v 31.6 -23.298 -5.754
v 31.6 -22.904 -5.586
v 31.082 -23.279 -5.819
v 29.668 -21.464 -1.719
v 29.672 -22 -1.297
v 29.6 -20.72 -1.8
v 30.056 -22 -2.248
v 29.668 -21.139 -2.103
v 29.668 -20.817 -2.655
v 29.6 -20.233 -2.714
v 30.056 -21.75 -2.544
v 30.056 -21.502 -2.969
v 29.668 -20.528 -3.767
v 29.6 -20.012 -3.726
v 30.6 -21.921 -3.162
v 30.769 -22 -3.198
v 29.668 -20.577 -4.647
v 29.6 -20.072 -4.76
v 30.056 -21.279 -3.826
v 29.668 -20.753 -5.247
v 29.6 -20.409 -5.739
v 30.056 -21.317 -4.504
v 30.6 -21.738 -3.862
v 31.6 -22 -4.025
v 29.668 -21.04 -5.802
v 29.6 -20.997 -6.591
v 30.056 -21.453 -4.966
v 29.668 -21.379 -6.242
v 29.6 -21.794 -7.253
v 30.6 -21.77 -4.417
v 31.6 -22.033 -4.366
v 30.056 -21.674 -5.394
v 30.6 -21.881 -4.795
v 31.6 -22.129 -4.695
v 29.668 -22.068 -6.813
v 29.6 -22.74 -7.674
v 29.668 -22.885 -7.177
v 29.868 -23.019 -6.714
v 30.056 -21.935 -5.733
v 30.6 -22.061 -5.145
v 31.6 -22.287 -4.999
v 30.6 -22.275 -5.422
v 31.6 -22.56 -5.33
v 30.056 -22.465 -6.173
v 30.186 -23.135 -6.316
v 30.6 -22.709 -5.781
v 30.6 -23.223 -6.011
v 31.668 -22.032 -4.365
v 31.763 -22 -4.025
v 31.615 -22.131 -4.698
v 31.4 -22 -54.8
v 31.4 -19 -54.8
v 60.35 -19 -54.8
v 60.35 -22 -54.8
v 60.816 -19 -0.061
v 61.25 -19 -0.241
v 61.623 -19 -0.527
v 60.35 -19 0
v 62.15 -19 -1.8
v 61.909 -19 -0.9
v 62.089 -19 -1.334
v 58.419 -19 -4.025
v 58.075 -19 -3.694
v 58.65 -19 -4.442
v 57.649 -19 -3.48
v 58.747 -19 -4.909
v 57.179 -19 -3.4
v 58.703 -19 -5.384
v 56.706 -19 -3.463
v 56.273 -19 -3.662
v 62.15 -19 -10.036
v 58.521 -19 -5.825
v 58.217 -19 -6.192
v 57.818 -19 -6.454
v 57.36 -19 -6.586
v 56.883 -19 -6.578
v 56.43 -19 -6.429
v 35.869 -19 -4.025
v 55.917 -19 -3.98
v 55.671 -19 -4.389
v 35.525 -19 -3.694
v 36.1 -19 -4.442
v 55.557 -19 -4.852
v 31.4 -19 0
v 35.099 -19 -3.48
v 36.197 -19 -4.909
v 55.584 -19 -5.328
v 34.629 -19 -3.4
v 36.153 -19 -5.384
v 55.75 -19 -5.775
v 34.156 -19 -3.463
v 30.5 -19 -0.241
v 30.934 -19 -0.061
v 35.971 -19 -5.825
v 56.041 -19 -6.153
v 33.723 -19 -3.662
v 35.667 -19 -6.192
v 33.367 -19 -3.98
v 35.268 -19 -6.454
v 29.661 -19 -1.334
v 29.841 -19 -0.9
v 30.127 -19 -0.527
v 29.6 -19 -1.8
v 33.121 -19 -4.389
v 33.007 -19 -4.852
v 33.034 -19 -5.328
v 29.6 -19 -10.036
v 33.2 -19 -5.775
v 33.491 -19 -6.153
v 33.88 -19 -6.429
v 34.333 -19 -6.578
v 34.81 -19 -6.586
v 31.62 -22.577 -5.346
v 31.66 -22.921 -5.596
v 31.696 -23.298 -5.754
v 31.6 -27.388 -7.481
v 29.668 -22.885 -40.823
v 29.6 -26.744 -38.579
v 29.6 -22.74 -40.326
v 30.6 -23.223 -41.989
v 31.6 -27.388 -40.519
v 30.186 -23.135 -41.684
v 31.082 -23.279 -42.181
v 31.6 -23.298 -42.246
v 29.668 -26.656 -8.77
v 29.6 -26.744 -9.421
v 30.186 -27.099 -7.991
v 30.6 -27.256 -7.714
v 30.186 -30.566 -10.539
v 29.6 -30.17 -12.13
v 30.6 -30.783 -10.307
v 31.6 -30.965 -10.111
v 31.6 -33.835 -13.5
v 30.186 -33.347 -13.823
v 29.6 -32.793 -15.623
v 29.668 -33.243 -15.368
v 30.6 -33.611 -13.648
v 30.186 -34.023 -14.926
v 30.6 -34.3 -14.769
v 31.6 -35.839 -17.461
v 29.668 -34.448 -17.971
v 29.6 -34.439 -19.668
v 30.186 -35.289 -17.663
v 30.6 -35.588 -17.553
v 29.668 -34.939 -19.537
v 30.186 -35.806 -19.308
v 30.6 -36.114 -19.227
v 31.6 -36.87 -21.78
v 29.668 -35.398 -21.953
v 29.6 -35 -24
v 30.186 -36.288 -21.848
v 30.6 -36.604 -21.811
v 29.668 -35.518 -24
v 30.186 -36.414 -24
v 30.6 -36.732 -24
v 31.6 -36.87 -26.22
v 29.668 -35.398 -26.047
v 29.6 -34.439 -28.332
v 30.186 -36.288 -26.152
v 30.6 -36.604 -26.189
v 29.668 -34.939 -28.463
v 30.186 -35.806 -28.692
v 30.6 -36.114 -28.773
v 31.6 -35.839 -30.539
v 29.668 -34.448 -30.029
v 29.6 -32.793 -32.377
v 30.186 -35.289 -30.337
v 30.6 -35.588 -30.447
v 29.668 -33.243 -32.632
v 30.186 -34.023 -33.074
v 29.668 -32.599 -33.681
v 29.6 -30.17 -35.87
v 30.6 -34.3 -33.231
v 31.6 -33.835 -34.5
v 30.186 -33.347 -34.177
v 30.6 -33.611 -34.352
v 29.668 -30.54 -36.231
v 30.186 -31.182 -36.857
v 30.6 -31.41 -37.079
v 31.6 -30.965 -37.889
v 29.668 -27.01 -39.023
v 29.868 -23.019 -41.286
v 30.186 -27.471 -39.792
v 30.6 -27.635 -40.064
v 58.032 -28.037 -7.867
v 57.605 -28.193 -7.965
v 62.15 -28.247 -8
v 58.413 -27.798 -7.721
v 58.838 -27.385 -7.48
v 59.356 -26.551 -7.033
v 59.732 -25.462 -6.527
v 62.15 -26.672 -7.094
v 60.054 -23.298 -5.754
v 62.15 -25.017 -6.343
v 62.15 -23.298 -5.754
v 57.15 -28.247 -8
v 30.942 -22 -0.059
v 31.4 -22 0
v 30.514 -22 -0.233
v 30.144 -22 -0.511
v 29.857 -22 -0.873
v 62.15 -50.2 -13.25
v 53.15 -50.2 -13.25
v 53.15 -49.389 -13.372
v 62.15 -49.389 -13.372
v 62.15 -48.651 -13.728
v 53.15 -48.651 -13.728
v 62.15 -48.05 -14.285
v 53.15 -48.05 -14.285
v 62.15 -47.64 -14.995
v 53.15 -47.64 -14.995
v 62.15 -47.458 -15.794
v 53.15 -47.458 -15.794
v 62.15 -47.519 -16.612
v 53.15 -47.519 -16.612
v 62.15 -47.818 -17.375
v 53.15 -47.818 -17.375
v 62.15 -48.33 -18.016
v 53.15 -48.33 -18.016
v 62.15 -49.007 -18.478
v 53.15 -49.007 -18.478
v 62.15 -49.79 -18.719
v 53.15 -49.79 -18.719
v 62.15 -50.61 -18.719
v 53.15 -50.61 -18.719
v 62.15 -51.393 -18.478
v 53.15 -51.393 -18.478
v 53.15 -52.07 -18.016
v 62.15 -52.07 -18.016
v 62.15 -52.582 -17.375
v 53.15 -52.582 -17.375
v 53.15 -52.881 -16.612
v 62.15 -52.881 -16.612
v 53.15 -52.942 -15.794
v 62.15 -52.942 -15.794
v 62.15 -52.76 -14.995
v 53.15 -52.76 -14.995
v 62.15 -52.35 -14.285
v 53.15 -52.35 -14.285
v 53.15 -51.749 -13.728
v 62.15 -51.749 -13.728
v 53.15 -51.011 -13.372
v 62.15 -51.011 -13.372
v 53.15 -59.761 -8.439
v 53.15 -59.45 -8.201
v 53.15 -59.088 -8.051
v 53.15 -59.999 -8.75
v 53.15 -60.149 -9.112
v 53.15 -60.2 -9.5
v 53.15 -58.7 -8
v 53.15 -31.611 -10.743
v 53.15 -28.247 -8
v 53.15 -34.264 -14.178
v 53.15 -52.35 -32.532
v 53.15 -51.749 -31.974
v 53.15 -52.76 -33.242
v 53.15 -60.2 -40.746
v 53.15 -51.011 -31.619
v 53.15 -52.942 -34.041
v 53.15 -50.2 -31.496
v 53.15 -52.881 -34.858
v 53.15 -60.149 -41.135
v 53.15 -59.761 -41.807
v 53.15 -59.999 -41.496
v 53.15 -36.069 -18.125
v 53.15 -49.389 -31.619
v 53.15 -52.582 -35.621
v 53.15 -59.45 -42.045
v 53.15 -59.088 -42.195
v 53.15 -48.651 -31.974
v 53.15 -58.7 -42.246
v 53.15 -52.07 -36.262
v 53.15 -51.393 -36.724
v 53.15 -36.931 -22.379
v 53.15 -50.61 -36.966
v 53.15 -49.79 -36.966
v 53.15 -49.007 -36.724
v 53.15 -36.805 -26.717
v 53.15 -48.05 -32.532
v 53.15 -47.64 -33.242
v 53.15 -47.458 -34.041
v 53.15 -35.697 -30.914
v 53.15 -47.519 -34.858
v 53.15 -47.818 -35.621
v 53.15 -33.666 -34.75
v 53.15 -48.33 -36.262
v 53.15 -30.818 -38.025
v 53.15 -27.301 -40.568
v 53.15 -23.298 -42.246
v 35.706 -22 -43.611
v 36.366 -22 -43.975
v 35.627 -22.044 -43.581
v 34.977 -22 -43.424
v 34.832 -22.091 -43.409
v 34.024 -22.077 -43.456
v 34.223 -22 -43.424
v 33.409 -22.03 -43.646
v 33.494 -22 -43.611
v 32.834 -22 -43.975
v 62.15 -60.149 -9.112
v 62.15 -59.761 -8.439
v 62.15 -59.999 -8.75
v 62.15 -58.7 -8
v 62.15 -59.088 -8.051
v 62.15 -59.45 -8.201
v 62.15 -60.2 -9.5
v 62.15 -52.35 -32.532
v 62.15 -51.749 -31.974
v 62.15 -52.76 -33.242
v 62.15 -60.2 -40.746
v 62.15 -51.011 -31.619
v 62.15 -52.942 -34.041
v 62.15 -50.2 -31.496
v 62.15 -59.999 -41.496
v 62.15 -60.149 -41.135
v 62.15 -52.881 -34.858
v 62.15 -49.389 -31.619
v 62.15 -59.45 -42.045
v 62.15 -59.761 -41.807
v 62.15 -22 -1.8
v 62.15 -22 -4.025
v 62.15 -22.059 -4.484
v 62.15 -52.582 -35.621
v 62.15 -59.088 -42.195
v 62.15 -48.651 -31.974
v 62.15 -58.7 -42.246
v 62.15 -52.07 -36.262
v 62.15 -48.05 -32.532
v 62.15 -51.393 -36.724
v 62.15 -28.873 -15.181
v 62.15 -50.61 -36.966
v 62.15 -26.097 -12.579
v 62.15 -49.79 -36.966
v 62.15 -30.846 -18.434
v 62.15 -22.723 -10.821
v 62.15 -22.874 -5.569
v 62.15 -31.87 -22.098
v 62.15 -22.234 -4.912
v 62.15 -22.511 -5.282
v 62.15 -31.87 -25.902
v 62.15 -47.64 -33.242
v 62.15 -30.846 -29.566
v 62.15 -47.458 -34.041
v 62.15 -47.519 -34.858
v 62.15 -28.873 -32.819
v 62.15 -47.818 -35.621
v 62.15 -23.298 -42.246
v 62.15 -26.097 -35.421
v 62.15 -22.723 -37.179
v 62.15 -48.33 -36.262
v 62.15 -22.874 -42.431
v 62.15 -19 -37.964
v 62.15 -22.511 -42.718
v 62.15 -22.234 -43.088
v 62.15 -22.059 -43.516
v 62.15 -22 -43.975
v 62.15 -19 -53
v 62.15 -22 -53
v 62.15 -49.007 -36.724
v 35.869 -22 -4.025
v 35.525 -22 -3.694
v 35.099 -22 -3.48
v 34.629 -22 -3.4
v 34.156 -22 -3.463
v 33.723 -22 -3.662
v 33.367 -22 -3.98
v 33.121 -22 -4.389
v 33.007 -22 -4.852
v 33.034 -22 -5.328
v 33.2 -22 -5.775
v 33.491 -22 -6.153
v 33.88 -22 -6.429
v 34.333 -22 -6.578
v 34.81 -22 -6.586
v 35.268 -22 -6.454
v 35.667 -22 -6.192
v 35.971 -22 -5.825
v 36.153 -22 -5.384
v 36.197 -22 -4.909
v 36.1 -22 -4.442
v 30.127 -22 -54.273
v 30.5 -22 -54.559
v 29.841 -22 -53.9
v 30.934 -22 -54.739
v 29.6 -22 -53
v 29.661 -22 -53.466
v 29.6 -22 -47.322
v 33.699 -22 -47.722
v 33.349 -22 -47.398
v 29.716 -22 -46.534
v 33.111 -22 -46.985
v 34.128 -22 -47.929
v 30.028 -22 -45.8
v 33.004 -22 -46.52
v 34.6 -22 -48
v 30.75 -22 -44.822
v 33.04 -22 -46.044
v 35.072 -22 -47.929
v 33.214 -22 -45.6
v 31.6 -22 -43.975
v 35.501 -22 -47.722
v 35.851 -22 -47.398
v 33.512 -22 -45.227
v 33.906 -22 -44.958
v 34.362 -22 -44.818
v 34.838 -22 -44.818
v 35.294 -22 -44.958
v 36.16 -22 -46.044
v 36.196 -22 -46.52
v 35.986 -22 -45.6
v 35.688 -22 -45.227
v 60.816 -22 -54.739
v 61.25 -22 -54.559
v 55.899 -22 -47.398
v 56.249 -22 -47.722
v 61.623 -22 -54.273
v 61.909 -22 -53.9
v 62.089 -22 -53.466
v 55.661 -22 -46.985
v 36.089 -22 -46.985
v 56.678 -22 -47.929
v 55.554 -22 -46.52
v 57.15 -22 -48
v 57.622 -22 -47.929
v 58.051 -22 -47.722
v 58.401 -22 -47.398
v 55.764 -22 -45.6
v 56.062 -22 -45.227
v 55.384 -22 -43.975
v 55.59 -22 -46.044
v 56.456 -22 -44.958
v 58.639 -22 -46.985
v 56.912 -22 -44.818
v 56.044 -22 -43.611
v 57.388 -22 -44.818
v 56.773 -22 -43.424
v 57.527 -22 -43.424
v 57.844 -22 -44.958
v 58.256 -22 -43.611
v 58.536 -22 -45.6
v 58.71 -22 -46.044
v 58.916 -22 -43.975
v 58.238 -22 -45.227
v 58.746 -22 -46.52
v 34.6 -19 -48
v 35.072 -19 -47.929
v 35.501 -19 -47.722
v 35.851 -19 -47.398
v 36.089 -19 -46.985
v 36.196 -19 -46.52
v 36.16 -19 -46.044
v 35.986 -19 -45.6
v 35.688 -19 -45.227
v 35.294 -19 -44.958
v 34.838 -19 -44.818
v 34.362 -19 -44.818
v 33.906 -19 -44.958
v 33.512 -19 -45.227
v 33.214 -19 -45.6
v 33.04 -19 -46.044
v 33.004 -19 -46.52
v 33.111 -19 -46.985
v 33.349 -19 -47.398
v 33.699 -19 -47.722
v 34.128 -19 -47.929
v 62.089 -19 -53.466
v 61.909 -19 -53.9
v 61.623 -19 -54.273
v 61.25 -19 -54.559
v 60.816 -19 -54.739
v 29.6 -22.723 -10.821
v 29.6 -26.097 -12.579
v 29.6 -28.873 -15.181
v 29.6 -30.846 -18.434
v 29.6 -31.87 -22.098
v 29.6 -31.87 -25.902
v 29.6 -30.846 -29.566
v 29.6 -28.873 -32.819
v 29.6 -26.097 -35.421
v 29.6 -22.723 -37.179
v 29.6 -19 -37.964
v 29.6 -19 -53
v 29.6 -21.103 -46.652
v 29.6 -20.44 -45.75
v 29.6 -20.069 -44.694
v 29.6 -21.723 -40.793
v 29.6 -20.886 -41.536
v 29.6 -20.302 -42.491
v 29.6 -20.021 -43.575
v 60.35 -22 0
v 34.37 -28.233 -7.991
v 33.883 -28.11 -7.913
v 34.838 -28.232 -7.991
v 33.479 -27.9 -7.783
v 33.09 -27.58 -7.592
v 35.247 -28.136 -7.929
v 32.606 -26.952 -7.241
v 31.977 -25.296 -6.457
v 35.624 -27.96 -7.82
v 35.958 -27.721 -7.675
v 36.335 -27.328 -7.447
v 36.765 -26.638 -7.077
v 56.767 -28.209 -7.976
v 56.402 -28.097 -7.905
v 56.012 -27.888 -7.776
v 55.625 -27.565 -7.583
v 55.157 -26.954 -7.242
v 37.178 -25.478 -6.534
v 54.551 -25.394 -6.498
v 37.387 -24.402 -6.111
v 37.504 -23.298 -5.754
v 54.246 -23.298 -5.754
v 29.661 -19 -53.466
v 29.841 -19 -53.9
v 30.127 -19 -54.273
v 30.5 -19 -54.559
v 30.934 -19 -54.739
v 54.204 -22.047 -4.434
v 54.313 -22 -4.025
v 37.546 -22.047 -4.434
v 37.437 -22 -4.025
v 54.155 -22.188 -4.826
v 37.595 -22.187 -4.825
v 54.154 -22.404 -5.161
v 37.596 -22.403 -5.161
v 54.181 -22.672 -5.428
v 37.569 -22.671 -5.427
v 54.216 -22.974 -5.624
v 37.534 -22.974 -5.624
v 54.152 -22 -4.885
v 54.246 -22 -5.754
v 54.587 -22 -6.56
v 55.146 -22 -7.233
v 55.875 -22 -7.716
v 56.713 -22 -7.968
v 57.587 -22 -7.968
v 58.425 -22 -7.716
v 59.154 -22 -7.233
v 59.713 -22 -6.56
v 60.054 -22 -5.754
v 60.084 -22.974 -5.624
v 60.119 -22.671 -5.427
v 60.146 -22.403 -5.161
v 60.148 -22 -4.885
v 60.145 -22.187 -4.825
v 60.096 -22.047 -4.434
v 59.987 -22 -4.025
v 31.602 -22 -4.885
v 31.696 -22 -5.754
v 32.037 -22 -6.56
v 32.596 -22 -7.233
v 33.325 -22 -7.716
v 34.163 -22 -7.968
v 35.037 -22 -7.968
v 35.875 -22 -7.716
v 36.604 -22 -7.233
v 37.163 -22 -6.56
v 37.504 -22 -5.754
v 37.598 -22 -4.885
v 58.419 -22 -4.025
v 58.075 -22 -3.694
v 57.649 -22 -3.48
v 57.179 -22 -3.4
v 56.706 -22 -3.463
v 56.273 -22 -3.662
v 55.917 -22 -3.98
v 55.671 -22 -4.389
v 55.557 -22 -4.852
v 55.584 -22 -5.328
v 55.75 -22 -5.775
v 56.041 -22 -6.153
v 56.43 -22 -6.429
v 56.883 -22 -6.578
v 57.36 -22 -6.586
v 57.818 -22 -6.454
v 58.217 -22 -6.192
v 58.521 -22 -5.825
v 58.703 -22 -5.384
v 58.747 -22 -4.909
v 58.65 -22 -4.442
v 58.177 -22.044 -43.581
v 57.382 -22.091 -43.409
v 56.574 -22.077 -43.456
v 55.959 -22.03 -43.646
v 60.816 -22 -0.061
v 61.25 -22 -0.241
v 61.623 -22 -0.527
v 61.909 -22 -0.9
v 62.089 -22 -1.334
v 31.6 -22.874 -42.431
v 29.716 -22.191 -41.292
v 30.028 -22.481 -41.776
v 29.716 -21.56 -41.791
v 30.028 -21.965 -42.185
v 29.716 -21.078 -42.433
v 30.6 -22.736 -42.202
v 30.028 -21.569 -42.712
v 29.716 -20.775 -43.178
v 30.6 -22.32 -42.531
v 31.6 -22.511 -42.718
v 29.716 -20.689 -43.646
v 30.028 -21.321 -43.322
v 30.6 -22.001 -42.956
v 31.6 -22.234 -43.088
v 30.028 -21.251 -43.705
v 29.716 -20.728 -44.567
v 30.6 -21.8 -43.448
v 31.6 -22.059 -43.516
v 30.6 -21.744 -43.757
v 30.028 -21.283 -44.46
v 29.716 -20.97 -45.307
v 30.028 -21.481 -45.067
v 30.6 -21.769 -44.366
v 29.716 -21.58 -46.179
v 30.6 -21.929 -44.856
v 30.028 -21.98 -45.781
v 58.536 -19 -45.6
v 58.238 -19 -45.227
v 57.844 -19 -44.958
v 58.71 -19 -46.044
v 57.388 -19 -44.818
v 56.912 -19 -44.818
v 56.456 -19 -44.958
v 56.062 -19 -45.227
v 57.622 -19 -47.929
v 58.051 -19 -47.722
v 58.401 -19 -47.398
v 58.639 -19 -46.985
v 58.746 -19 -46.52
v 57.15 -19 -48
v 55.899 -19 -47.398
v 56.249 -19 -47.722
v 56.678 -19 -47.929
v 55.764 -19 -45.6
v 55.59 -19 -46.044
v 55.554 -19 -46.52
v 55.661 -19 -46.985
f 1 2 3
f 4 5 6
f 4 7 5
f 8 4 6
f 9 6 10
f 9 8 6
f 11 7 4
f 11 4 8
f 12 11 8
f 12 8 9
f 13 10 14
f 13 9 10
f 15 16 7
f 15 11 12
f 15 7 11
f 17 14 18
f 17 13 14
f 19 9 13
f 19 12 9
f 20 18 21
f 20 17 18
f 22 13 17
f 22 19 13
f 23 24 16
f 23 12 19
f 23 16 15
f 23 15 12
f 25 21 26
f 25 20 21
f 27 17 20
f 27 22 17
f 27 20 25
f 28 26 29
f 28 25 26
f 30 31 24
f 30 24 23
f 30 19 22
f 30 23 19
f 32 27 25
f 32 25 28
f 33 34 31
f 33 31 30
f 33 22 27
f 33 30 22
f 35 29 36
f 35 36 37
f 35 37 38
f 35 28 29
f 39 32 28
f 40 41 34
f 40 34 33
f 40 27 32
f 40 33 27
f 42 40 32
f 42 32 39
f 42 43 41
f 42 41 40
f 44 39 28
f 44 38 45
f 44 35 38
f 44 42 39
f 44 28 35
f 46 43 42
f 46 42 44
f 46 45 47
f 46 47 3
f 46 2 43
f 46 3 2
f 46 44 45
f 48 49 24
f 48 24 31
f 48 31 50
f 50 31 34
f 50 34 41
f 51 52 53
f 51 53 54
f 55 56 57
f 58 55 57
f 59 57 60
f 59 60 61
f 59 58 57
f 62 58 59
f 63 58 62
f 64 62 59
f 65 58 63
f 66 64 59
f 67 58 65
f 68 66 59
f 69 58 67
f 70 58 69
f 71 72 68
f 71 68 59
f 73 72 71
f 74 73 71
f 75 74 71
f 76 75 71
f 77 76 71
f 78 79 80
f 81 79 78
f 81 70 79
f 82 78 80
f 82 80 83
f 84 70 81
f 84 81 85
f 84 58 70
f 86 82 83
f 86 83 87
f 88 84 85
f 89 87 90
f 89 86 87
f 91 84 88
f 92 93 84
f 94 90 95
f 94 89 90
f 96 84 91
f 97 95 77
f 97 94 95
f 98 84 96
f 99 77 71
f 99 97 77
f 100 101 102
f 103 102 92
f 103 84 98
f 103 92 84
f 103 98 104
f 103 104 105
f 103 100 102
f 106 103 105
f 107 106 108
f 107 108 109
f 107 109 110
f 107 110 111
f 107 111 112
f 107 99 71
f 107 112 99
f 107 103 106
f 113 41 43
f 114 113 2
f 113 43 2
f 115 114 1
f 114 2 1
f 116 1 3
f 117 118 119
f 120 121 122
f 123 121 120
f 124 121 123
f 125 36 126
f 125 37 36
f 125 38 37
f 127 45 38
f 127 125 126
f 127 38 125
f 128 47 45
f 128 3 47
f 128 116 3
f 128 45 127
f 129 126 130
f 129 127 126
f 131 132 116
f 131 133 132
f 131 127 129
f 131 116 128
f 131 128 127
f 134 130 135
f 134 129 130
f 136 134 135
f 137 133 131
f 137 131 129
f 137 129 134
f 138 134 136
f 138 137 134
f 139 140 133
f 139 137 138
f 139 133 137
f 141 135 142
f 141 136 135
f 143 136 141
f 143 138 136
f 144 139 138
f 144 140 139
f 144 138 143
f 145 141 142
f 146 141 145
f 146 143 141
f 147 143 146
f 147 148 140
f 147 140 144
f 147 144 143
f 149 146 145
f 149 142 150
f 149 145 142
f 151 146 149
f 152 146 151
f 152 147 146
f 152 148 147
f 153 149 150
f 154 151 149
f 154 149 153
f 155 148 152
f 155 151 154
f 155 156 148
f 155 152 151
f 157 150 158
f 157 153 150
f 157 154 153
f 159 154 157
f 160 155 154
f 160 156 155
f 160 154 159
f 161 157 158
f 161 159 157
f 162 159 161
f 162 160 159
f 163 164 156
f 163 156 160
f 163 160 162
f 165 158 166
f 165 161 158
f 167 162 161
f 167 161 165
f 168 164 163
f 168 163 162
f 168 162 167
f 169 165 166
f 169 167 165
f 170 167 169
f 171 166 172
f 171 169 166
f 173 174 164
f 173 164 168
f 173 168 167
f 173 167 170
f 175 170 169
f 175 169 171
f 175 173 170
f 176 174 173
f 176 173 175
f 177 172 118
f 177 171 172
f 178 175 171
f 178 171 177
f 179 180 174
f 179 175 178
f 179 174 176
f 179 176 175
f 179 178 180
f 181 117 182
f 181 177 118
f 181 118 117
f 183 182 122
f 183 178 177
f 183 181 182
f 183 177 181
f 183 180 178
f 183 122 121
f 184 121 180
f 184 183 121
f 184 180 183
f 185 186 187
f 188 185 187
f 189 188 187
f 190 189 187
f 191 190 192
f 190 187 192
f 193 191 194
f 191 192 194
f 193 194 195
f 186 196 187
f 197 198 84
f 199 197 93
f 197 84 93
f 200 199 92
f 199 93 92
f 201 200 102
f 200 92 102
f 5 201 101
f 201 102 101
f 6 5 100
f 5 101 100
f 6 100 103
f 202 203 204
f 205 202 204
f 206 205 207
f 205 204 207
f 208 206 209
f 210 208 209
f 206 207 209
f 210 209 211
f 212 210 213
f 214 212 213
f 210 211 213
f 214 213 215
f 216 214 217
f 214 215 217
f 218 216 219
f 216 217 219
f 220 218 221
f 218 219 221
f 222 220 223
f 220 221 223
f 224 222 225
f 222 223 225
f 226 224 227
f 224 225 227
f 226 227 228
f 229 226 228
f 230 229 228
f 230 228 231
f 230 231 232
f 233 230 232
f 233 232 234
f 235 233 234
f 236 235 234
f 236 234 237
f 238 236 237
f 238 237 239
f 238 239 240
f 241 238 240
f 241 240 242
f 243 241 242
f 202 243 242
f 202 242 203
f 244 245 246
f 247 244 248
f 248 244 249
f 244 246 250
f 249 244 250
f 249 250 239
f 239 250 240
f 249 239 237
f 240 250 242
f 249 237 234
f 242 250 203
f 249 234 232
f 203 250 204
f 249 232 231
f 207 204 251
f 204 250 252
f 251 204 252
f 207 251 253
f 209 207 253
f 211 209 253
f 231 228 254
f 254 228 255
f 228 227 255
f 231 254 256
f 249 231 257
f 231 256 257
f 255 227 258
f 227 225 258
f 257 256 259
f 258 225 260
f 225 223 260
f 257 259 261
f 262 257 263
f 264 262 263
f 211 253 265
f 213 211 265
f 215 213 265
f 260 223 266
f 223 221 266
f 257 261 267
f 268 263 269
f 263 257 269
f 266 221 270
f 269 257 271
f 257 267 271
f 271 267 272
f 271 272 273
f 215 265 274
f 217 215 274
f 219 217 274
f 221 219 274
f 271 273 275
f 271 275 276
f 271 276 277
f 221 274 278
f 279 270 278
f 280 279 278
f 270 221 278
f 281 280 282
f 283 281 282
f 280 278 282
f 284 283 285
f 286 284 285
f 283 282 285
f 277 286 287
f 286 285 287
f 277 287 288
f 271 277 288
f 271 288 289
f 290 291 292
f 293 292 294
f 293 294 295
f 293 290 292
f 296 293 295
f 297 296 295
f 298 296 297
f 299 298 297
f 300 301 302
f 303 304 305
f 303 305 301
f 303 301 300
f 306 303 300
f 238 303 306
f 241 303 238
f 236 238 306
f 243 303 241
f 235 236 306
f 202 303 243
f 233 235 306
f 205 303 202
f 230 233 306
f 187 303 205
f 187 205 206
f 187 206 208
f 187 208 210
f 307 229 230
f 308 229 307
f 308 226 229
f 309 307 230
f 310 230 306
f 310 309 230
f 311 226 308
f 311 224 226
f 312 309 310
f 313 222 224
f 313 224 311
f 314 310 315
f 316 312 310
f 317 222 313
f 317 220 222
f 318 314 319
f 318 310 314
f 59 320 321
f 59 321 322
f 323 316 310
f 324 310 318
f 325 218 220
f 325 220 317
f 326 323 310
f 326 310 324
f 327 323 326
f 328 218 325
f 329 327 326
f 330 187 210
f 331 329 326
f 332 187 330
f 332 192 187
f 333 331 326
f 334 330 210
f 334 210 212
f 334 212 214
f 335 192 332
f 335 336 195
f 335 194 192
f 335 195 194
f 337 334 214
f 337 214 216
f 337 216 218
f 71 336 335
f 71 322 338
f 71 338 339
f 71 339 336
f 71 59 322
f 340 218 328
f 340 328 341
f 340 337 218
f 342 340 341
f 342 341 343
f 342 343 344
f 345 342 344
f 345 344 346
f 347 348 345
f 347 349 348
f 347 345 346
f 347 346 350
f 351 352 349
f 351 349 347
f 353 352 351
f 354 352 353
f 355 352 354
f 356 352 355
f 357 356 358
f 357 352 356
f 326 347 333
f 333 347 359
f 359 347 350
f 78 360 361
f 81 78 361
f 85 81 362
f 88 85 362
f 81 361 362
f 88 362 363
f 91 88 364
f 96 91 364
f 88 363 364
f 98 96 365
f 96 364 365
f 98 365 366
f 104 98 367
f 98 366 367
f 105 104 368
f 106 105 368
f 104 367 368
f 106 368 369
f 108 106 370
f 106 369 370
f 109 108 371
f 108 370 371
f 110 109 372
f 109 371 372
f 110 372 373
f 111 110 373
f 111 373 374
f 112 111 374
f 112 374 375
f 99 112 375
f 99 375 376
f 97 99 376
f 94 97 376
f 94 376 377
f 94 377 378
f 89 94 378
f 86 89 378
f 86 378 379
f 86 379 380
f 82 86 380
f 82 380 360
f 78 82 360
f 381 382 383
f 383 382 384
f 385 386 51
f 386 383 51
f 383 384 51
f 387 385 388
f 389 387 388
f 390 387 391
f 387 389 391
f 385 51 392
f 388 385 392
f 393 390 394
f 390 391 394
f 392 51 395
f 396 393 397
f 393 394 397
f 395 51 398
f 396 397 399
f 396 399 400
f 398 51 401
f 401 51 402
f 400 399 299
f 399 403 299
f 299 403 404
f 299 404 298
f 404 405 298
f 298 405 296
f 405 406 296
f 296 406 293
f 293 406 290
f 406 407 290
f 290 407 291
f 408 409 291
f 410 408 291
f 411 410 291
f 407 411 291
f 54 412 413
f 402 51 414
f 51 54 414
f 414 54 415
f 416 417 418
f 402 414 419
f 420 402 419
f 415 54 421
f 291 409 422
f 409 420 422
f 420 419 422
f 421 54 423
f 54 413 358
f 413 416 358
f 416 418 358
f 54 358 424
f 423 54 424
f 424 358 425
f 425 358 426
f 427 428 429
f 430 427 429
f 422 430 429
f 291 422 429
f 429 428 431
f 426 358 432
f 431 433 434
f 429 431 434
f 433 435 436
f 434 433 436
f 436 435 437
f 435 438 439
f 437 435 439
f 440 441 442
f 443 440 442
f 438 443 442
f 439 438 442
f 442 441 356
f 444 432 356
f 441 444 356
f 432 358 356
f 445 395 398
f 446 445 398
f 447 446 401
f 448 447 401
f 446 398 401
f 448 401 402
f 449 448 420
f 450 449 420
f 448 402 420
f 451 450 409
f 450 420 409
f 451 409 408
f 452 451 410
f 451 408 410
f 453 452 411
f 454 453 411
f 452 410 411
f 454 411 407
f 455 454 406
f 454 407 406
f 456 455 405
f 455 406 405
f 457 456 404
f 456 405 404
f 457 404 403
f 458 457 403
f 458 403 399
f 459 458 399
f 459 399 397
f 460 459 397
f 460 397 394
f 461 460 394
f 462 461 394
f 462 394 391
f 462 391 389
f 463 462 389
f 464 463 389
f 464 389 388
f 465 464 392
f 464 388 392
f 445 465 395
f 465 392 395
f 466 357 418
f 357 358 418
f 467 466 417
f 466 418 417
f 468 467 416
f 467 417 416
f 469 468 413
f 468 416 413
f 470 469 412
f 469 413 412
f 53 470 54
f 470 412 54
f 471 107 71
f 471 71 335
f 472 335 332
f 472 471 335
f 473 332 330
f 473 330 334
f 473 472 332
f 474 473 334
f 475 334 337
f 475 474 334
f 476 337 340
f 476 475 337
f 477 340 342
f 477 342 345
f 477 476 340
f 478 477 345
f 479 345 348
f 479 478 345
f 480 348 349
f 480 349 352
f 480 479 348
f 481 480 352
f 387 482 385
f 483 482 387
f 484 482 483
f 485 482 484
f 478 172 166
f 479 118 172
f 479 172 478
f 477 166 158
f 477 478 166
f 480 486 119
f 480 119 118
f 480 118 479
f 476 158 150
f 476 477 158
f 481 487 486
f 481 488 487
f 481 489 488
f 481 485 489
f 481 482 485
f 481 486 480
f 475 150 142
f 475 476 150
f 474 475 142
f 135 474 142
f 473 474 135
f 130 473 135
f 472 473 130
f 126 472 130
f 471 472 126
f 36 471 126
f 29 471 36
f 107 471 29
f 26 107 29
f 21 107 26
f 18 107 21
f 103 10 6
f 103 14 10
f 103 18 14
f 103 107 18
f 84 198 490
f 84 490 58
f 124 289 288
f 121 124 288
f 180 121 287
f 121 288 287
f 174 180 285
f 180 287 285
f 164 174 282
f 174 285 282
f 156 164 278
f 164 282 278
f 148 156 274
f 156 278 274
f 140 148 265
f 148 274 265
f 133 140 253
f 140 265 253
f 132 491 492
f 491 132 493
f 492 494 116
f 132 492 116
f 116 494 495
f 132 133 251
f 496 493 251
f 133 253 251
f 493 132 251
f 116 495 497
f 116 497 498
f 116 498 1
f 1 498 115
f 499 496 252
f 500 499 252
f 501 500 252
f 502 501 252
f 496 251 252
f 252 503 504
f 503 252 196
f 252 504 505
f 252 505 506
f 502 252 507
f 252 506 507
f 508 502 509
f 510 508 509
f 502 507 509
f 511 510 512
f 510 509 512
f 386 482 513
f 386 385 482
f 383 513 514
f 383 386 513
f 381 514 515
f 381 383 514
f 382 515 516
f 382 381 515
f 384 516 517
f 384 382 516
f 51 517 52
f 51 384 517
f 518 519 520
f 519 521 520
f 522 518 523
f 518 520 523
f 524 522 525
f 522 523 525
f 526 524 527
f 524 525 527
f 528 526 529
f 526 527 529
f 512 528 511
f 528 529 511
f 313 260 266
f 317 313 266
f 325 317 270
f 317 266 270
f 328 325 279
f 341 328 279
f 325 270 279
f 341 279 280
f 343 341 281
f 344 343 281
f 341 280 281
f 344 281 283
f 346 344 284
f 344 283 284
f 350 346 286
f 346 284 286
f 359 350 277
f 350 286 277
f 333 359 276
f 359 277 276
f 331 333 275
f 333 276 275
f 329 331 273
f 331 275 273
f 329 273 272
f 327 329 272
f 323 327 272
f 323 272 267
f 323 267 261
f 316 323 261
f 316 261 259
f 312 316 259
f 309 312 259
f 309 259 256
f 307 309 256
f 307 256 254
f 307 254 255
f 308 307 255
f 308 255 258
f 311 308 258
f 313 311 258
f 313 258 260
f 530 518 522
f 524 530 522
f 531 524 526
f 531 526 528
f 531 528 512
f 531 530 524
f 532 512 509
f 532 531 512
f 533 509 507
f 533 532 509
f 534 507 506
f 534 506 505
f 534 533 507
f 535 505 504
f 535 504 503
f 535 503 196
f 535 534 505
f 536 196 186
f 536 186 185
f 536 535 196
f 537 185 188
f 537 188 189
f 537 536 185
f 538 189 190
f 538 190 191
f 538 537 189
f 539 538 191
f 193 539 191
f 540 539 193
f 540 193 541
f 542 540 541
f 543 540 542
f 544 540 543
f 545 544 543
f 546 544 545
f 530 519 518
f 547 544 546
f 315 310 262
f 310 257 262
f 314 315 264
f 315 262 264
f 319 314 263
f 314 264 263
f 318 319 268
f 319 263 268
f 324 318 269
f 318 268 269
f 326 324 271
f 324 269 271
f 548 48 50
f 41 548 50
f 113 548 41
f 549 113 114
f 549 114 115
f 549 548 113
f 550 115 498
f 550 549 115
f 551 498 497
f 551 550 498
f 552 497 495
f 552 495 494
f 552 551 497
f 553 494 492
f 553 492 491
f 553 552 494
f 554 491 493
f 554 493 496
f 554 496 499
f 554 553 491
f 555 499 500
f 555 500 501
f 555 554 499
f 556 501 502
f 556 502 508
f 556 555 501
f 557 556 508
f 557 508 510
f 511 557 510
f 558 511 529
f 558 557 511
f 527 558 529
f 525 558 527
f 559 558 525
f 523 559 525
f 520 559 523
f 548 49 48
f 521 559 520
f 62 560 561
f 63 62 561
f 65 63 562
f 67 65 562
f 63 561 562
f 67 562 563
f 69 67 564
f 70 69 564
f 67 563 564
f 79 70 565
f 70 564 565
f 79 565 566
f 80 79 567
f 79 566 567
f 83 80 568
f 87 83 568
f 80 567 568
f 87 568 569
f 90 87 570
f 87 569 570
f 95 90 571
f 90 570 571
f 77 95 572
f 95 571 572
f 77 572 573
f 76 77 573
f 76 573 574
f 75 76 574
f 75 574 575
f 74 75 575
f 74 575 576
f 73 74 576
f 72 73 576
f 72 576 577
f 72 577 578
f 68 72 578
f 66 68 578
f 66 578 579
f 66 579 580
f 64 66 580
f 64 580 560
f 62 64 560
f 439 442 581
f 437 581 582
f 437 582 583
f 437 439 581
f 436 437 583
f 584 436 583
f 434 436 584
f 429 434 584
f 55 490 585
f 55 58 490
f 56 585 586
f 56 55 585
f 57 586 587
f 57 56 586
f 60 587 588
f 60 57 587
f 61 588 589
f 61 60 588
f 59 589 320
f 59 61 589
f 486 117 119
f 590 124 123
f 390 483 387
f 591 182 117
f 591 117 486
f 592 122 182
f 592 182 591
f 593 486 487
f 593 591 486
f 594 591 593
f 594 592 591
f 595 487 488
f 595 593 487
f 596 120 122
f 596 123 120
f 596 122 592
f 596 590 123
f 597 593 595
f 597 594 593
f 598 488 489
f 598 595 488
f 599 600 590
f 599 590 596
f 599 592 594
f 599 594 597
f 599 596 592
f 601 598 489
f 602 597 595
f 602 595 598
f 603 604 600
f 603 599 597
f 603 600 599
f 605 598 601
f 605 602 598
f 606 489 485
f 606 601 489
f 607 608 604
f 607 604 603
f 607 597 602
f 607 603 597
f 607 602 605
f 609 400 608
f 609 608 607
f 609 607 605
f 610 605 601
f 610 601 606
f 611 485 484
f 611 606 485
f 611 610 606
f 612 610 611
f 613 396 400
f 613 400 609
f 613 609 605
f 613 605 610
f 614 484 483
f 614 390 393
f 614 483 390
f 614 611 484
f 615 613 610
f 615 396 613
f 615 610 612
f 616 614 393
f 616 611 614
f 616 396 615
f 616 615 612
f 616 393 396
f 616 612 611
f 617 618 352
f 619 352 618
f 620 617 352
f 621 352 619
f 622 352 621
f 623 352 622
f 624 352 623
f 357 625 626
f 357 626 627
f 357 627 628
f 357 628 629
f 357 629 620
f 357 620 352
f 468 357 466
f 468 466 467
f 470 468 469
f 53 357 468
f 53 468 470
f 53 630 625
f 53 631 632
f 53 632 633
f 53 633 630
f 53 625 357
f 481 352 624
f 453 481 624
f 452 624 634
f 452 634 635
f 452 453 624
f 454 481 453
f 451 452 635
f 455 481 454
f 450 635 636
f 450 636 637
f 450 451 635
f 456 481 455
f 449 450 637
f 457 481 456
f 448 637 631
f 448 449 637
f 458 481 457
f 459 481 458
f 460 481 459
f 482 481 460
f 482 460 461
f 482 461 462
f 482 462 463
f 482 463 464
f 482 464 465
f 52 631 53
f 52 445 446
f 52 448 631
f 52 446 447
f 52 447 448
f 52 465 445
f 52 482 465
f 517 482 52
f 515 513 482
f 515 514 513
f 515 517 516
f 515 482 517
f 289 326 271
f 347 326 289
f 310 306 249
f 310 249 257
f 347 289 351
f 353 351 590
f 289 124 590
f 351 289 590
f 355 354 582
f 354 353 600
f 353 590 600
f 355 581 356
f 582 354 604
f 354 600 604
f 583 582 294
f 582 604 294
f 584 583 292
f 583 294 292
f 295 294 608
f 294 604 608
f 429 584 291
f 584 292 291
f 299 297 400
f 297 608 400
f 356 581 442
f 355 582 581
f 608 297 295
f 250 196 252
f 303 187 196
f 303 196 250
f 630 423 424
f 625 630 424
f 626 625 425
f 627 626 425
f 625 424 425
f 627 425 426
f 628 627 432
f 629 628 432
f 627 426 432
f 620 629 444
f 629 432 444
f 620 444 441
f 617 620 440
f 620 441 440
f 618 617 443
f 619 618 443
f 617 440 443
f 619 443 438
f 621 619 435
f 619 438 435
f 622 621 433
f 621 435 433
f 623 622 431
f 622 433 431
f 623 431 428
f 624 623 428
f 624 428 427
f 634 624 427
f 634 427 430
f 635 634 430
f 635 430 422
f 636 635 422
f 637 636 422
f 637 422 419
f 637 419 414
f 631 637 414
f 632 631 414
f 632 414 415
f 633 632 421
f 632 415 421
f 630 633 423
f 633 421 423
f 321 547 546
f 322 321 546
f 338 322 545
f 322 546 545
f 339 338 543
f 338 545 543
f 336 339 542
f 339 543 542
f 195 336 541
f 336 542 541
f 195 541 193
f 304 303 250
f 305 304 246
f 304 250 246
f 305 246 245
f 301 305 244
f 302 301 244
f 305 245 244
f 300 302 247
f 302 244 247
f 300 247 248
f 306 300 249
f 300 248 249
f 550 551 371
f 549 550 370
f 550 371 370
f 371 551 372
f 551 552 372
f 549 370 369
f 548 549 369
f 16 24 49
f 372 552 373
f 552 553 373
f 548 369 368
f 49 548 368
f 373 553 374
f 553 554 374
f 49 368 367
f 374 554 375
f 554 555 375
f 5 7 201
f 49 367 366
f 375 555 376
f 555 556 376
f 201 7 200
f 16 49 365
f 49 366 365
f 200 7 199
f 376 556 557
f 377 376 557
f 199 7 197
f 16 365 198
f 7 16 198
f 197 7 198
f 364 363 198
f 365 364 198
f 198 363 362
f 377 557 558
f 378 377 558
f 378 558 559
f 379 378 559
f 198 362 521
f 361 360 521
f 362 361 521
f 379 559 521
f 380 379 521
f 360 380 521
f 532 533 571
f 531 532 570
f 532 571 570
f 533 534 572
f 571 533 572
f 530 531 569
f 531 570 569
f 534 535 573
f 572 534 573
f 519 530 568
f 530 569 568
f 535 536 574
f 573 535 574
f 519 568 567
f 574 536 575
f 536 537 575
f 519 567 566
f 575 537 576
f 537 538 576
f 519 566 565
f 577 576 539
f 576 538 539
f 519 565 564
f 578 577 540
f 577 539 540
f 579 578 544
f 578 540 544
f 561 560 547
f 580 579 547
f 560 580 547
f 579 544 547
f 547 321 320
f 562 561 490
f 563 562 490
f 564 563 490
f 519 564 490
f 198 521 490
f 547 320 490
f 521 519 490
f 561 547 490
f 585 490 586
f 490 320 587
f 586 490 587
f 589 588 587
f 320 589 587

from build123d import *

# Parameters (mm, degrees)
SKETCH1_W                       = 62.15
SKETCH1_H                       = 78
BOSS_EXTRUDE1_DEPTH             = 9
SPRING_PULLEY_CUTOUT_DEPTH      = 10
SPRING_PULLEY_CUTOUT_DEPTH_BACK = 11.2
SKETCH2_R                       = 25
SKETCH3_R                       = 1.225
CUT_EXTRUDE2_DEPTH              = 7.5
SKETCH4_R                       = 0.75
CUT_EXTRUDE3_DEPTH              = 101.014361469
CHAMFER1_SIZE                   = 0.4
CHAMFER1_SIZE2                  = 0.692820323
MOTOR_HOLDER_DEPTH              = 32.95
MOVE_FACE7_BY                   = 0.4
SKETCH20_R                      = 2.55
CUT_EXTRUDE8_DEPTH              = 7
BOSS_EXTRUDE5_DEPTH             = 32.55
MOVE_FACE3_BY                   = 1
CUT_EXTRUDE12_DEPTH             = 108.086985671
FILLET12_R                      = 1.8
SKETCH24_R                      = 1.6
MOTOR_CLIP_HOLES_DEPTH          = 3
SKETCH26_W                      = 5.75
SKETCH26_H                      = 12.7
CUT_EXTRUDE13_DEPTH             = 110.829970864
SKETCH27_R                      = 2
CUT_EXTRUDE14_DEPTH             = 7.25
SKETCH29_R                      = 0.8
CUT_EXTRUDE16_DEPTH             = 5
SKETCH52_W                      = 78
SKETCH52_H                      = 9
CUT_EXTRUDE31_DEPTH             = 7.25
MOVE_START                      = -54.4
MOVE_FACE6_OUTLINE_W            = 5.75
MOVE_FACE6_OUTLINE_H            = 9
MOVE_FACE6_DEPTH                = 13.1
SKETCH31_W                      = 2
SKETCH31_H                      = 4
SKETCH32_R                      = 3
CUT_EXTRUDE17_DEPTH             = 105.439563953
MOTOR_CLIP_WIRE_FILLET_R        = 2
BOSS_EXTRUDE8_DEPTH             = 9
FILLET13_R                      = 1.5
M5_CLEARANCE_HOLE1_D            = 5.5


# Read off the part's stored shape, not the designer's step: Move Face6
with BuildPart() as part:
    # Sketch1 → Boss-Extrude1 (new body)
    with BuildSketch(Plane(origin=(0, 0, 0), x_dir=(1, 0, 0), z_dir=(0, 1, 0))):
        with Locations((31.075, 39)):
            Rectangle(SKETCH1_W, SKETCH1_H)
    extrude(amount=BOSS_EXTRUDE1_DEPTH)

    # Sketch2 → spring_pulley_cutout (cut, two sides: drawn at the far end of the back side and taken through both)
    with BuildSketch(Plane.ZY.offset(-18).offset(-SPRING_PULLEY_CUTOUT_DEPTH_BACK)):
        with Locations((-24, -18)):
            Circle(SKETCH2_R)
    extrude(amount=SPRING_PULLEY_CUTOUT_DEPTH + SPRING_PULLEY_CUTOUT_DEPTH_BACK, mode=Mode.SUBTRACT)

    # Sketch3 → Cut-Extrude2 (cut)
    with BuildSketch(Plane(origin=(0, 9, 0), x_dir=(1, 0, 0), z_dir=(0, 1, 0))):
        with Locations(Location((12.85, 4, 0), (0, 0, 270))):
            Circle(SKETCH3_R)
        with Locations(Location((23.15, 44, 0), (0, 0, 270))):
            Circle(SKETCH3_R)
    extrude(amount=-CUT_EXTRUDE2_DEPTH, mode=Mode.SUBTRACT)

    # Sketch4 → Cut-Extrude3 (cut, through all)
    with BuildSketch(Plane(origin=(0, 1.5, 0), x_dir=(1, 0, 0), z_dir=(0, 1, 0))):
        with Locations(Location((12.85, 4, 0), (0, 0, 270))):
            Circle(SKETCH4_R)
        with Locations(Location((23.15, 44, 0), (0, 0, 270))):
            Circle(SKETCH4_R)
    extrude(amount=-CUT_EXTRUDE3_DEPTH, mode=Mode.SUBTRACT)

    # Chamfer1
    chamfer1_edges = [part.edges().sort_by_distance(p)[0] for p in [
        (12.85, 9, -5.225),
        (23.15, 9, -45.225),
    ]]
    chamfer1_side = [part.faces().sort_by_distance(p)[0] for p in [
        (31.100480241, 9, -39.029231634),
    ]]
    chamfer(chamfer1_edges, length=CHAMFER1_SIZE, length2=CHAMFER1_SIZE2, reference=chamfer1_side[0])

    # Sketch19 → Motor Holder (add)
    with BuildSketch(Plane.ZY.offset(-29.2)):
        with BuildLine():
            Line((-54.8, -18), (-38, -18))
            ThreePointArc((-38, -18), (-24, -4), (-10, -18))
            Line((-10, -18), (0, -18))
            Line((0, -18), (0, 0))
            Line((0, 0), (-54.8, 0))
            Line((-54.8, 0), (-54.8, -18))
        make_face()
    extrude(amount=-MOTOR_HOLDER_DEPTH)

    # Move Face7: a face moved inward by 0.4
    extrude(part.faces().sort_by_distance((29.2, 0.75, -27.4))[0], amount=MOVE_FACE7_BY, dir=(1, 0, 0), mode=Mode.SUBTRACT)

    # Sketch20 → Cut-Extrude8 (cut)
    with BuildSketch(Plane(origin=(0, -18, 0), x_dir=(-1, 0, 0), z_dir=(0, -1, 0))):
        with Locations(Location((-57.15, 5, 0), (0, 0, 90))):
            Circle(SKETCH20_R)
        with Locations(Location((-34.6, 5, 0), (0, 0, 90))):
            Circle(SKETCH20_R)
        with Locations(Location((-57.15, 46.4, 0), (0, 0, 90))):
            Circle(SKETCH20_R)
        with Locations(Location((-34.6, 46.4, 0), (0, 0, 90))):
            Circle(SKETCH20_R)
    extrude(amount=-CUT_EXTRUDE8_DEPTH, mode=Mode.SUBTRACT)

    # Move Face3: a face moved inward by 1.0
    extrude(part.faces().sort_by_distance((8, 2.836578696, -24))[0], amount=MOVE_FACE3_BY, dir=(-1, 0, 0), mode=Mode.SUBTRACT)

    # Sketch26 → Cut-Extrude13 (cut, through all)
    with BuildSketch(Plane(origin=(0, 9, 0), x_dir=(1, 0, 0), z_dir=(0, 1, 0))):
        with Locations((10.125, 47.85)):
            Rectangle(SKETCH26_W, SKETCH26_H)
    extrude(amount=-CUT_EXTRUDE13_DEPTH, mode=Mode.SUBTRACT)

    # Sketch27 → Cut-Extrude14 (cut)
    with BuildSketch(Plane.ZY):
        with Locations((-44.6, 5)):
            Circle(SKETCH27_R)
        with Locations((-51.1, 5)):
            Circle(SKETCH27_R)
    extrude(amount=-CUT_EXTRUDE14_DEPTH, mode=Mode.SUBTRACT)

    # Sketch29 → Cut-Extrude16 (cut)
    with BuildSketch(Plane.ZY.offset(-13)):
        with Locations((-51.1, 5)):
            Circle(SKETCH29_R)
        with Locations((-44.6, 5)):
            Circle(SKETCH29_R)
    extrude(amount=-CUT_EXTRUDE16_DEPTH, mode=Mode.SUBTRACT)

    # Sketch52 → Cut-Extrude31 (cut)
    with BuildSketch(Plane.ZY):
        with Locations((-39, 4.5)):
            Rectangle(SKETCH52_W, SKETCH52_H)
    extrude(amount=-CUT_EXTRUDE31_DEPTH, mode=Mode.SUBTRACT)

    # Move Face6 outline → Move Face6 (cut)
    with BuildSketch(Plane.XY.offset(MOVE_START)):
        with Locations((10.125, 4.5)):
            Rectangle(MOVE_FACE6_OUTLINE_W, MOVE_FACE6_OUTLINE_H)
    extrude(amount=MOVE_FACE6_DEPTH, mode=Mode.SUBTRACT)

    # Cut-Sweep1: sweep along a path in Sketch30
    with BuildLine(Plane(origin=(0, -12, 0), x_dir=(-1, 0, 0), z_dir=(0, -1, 0))) as cut_sweep1_path:
        CenterArc((-45.875, 0), 5, 0, 360)
    # Sketch31 → Cut-Sweep1 (sweep, cut)
    with BuildSketch(Plane(origin=(0, 0, 0), x_dir=(-1, 0, 0), z_dir=(0, 0, -1))):
        with Locations((-42.875, -12)):
            Rectangle(SKETCH31_W, SKETCH31_H)
    sweep(path=cut_sweep1_path.line, mode=Mode.SUBTRACT)


with BuildPart() as body_2:
    # Sketch22 → Boss-Extrude5 (new body)
    with BuildSketch(Plane.ZY.offset(-29.6)):
        with BuildLine():
            Line((0, -19), (-10.035759956, -19))
            ThreePointArc((-10.035759956, -19), (-24, -32), (-37.964240044, -19))
            Line((-37.964240044, -19), (-54.8, -19))
            Line((-54.8, -19), (-54.8, -39))
            Line((-54.8, -39), (0, -39))
            Line((0, -39), (0, -19))
        make_face()
    extrude(amount=-BOSS_EXTRUDE5_DEPTH)

    # Sketch25 → Cut-Extrude12 (cut, through all)
    with BuildSketch(Plane(origin=(62.15, 0, 0), x_dir=(0, 0, -1), z_dir=(1, 0, 0))):
        with BuildLine():
            Line((54.8, -22), (42.574175621, -22))
            ThreePointArc((42.574175621, -22), (24, -37), (5.425824379, -22))
            Line((5.425824379, -22), (0, -22))
            Line((0, -22), (0, -42))
            Line((0, -42), (54.8, -42))
            Line((54.8, -42), (54.8, -22))
        make_face()
    extrude(amount=-CUT_EXTRUDE12_DEPTH, mode=Mode.SUBTRACT)

    # Fillet12
    fillet12_edges = [body_2.edges().sort_by_distance(p)[0] for p in [
        (62.15, -20.5, 0),
        (62.15, -20.5, -54.8),
        (29.6, -20.5, 0),
        (45.875, -22, -5.425824379),
        (45.875, -22, -42.574175621),
        (29.6, -20.5, -54.8),
    ]]
    fillet(fillet12_edges, radius=FILLET12_R)

    # Sketch24 → Motor Clip Holes (cut)
    with BuildSketch(Plane.XZ.offset(22)):
        with Locations(Location((34.6, -5, 0), (0, 0, 37.543618534))):
            Circle(SKETCH24_R)
        with Locations(Location((57.15, -5, 0), (0, 0, 37.543618534))):
            Circle(SKETCH24_R)
        with Locations(Location((34.6, -46.4, 0), (0, 0, 270))):
            Circle(SKETCH24_R)
        with Locations(Location((57.15, -46.4, 0), (0, 0, 270))):
            Circle(SKETCH24_R)
    extrude(amount=-MOTOR_CLIP_HOLES_DEPTH, mode=Mode.SUBTRACT)

    # Sketch32 → Cut-Extrude17 (cut, through all)
    with BuildSketch(Plane.XZ.offset(22)):
        with Locations((57.15, -5)):
            Circle(SKETCH32_R)
        with Locations((57.15, -46.4)):
            Circle(SKETCH32_R)
        with Locations((34.6, -46.4)):
            Circle(SKETCH32_R)
        with Locations((34.6, -5)):
            Circle(SKETCH32_R)
    extrude(amount=CUT_EXTRUDE17_DEPTH, mode=Mode.SUBTRACT)

    # Motor Clip Wire Fillet
    # the kernel refuses this fillet: 2 mm, written as the material it takes off along each edge
    with BuildSketch(Plane(origin=(29.6, -18, -24), x_dir=(0, -0.27884615384615374, 0.9603357863191433), z_dir=(0, 0.9603357863191433, 0.27884615384615374))) as motor_clip_wire_fillet_piece_1:
        with BuildLine():
            CenterArc((19 - MOTOR_CLIP_WIRE_FILLET_R, MOTOR_CLIP_WIRE_FILLET_R), MOTOR_CLIP_WIRE_FILLET_R, 270, 90)
            Line((19 - MOTOR_CLIP_WIRE_FILLET_R, 0), (19, 0))
            Line((19, 0), (19, MOTOR_CLIP_WIRE_FILLET_R))
        make_face()
    revolve(axis=Axis((29.6, -18, -24), (1, 0, 0)), revolution_arc=147.617296723, mode=Mode.SUBTRACT)
    with BuildSketch(Plane(origin=(29.6, -23.8, -43.974984355), x_dir=(0, 0.2788461538461544, 0.960335786319143), z_dir=(0, -0.960335786319143, 0.2788461538461544))) as motor_clip_wire_fillet_piece_2:
        with BuildLine():
            CenterArc((1.8 + MOTOR_CLIP_WIRE_FILLET_R, -MOTOR_CLIP_WIRE_FILLET_R), MOTOR_CLIP_WIRE_FILLET_R, 90, 90)
            Line((1.8 + MOTOR_CLIP_WIRE_FILLET_R, 0), (1.8, 0))
            Line((1.8, 0), (1.8, -MOTOR_CLIP_WIRE_FILLET_R))
        make_face()
    revolve(axis=Axis((29.6, -23.8, -43.974984355), (-1, 0, 0)), revolution_arc=233.006586684, mode=Mode.SUBTRACT)
    with BuildSketch(Plane(origin=(29.6, -23.8, -4.025015645), x_dir=(0, -0.9348128979547861, 0.3551406000690075), z_dir=(0, -0.3551406000690075, -0.9348128979547861))) as motor_clip_wire_fillet_piece_3:
        with BuildLine():
            CenterArc((1.8 + MOTOR_CLIP_WIRE_FILLET_R, -MOTOR_CLIP_WIRE_FILLET_R), MOTOR_CLIP_WIRE_FILLET_R, 90, 90)
            Line((1.8 + MOTOR_CLIP_WIRE_FILLET_R, 0), (1.8, 0))
            Line((1.8, 0), (1.8, -MOTOR_CLIP_WIRE_FILLET_R))
        make_face()
    revolve(axis=Axis((29.6, -23.8, -4.025015645), (-1, 0, 0)), revolution_arc=233.006586684, mode=Mode.SUBTRACT)

    # Sketch64 → Boss-Extrude8 (add)
    with BuildSketch(Plane(origin=(62.15, 0, 0), x_dir=(0, 0, -1), z_dir=(1, 0, 0))):
        with BuildLine():
            Line((8, -28.246950766), (8, -60.2))
            Line((8, -60.2), (42.24637994, -60.2))
            Line((42.24637994, -60.2), (42.24637994, -23.298076923))
            ThreePointArc((42.24637994, -23.298076923), (26.717424109, -36.804669798), (8, -28.246950766))
        make_face()
    extrude(amount=-BOSS_EXTRUDE8_DEPTH)

    # Fillet13
    fillet13_edges = [body_2.edges().sort_by_distance(p)[0] for p in [
        (57.65, -60.2, -42.24637994),
        (57.65, -60.2, -8),
    ]]
    fillet(fillet13_edges, radius=FILLET13_R)

    # M5 Clearance Hole1 (through all)
    with Locations(Plane(origin=(62.15, 0, 0), x_dir=(0, 0, -1), z_dir=(1, 0, 0))):
        with Locations((16, -50.2), (34.24637994, -50.2)):
            Hole(M5_CLEARANCE_HOLE1_D / 2)


solid = body_2.part
